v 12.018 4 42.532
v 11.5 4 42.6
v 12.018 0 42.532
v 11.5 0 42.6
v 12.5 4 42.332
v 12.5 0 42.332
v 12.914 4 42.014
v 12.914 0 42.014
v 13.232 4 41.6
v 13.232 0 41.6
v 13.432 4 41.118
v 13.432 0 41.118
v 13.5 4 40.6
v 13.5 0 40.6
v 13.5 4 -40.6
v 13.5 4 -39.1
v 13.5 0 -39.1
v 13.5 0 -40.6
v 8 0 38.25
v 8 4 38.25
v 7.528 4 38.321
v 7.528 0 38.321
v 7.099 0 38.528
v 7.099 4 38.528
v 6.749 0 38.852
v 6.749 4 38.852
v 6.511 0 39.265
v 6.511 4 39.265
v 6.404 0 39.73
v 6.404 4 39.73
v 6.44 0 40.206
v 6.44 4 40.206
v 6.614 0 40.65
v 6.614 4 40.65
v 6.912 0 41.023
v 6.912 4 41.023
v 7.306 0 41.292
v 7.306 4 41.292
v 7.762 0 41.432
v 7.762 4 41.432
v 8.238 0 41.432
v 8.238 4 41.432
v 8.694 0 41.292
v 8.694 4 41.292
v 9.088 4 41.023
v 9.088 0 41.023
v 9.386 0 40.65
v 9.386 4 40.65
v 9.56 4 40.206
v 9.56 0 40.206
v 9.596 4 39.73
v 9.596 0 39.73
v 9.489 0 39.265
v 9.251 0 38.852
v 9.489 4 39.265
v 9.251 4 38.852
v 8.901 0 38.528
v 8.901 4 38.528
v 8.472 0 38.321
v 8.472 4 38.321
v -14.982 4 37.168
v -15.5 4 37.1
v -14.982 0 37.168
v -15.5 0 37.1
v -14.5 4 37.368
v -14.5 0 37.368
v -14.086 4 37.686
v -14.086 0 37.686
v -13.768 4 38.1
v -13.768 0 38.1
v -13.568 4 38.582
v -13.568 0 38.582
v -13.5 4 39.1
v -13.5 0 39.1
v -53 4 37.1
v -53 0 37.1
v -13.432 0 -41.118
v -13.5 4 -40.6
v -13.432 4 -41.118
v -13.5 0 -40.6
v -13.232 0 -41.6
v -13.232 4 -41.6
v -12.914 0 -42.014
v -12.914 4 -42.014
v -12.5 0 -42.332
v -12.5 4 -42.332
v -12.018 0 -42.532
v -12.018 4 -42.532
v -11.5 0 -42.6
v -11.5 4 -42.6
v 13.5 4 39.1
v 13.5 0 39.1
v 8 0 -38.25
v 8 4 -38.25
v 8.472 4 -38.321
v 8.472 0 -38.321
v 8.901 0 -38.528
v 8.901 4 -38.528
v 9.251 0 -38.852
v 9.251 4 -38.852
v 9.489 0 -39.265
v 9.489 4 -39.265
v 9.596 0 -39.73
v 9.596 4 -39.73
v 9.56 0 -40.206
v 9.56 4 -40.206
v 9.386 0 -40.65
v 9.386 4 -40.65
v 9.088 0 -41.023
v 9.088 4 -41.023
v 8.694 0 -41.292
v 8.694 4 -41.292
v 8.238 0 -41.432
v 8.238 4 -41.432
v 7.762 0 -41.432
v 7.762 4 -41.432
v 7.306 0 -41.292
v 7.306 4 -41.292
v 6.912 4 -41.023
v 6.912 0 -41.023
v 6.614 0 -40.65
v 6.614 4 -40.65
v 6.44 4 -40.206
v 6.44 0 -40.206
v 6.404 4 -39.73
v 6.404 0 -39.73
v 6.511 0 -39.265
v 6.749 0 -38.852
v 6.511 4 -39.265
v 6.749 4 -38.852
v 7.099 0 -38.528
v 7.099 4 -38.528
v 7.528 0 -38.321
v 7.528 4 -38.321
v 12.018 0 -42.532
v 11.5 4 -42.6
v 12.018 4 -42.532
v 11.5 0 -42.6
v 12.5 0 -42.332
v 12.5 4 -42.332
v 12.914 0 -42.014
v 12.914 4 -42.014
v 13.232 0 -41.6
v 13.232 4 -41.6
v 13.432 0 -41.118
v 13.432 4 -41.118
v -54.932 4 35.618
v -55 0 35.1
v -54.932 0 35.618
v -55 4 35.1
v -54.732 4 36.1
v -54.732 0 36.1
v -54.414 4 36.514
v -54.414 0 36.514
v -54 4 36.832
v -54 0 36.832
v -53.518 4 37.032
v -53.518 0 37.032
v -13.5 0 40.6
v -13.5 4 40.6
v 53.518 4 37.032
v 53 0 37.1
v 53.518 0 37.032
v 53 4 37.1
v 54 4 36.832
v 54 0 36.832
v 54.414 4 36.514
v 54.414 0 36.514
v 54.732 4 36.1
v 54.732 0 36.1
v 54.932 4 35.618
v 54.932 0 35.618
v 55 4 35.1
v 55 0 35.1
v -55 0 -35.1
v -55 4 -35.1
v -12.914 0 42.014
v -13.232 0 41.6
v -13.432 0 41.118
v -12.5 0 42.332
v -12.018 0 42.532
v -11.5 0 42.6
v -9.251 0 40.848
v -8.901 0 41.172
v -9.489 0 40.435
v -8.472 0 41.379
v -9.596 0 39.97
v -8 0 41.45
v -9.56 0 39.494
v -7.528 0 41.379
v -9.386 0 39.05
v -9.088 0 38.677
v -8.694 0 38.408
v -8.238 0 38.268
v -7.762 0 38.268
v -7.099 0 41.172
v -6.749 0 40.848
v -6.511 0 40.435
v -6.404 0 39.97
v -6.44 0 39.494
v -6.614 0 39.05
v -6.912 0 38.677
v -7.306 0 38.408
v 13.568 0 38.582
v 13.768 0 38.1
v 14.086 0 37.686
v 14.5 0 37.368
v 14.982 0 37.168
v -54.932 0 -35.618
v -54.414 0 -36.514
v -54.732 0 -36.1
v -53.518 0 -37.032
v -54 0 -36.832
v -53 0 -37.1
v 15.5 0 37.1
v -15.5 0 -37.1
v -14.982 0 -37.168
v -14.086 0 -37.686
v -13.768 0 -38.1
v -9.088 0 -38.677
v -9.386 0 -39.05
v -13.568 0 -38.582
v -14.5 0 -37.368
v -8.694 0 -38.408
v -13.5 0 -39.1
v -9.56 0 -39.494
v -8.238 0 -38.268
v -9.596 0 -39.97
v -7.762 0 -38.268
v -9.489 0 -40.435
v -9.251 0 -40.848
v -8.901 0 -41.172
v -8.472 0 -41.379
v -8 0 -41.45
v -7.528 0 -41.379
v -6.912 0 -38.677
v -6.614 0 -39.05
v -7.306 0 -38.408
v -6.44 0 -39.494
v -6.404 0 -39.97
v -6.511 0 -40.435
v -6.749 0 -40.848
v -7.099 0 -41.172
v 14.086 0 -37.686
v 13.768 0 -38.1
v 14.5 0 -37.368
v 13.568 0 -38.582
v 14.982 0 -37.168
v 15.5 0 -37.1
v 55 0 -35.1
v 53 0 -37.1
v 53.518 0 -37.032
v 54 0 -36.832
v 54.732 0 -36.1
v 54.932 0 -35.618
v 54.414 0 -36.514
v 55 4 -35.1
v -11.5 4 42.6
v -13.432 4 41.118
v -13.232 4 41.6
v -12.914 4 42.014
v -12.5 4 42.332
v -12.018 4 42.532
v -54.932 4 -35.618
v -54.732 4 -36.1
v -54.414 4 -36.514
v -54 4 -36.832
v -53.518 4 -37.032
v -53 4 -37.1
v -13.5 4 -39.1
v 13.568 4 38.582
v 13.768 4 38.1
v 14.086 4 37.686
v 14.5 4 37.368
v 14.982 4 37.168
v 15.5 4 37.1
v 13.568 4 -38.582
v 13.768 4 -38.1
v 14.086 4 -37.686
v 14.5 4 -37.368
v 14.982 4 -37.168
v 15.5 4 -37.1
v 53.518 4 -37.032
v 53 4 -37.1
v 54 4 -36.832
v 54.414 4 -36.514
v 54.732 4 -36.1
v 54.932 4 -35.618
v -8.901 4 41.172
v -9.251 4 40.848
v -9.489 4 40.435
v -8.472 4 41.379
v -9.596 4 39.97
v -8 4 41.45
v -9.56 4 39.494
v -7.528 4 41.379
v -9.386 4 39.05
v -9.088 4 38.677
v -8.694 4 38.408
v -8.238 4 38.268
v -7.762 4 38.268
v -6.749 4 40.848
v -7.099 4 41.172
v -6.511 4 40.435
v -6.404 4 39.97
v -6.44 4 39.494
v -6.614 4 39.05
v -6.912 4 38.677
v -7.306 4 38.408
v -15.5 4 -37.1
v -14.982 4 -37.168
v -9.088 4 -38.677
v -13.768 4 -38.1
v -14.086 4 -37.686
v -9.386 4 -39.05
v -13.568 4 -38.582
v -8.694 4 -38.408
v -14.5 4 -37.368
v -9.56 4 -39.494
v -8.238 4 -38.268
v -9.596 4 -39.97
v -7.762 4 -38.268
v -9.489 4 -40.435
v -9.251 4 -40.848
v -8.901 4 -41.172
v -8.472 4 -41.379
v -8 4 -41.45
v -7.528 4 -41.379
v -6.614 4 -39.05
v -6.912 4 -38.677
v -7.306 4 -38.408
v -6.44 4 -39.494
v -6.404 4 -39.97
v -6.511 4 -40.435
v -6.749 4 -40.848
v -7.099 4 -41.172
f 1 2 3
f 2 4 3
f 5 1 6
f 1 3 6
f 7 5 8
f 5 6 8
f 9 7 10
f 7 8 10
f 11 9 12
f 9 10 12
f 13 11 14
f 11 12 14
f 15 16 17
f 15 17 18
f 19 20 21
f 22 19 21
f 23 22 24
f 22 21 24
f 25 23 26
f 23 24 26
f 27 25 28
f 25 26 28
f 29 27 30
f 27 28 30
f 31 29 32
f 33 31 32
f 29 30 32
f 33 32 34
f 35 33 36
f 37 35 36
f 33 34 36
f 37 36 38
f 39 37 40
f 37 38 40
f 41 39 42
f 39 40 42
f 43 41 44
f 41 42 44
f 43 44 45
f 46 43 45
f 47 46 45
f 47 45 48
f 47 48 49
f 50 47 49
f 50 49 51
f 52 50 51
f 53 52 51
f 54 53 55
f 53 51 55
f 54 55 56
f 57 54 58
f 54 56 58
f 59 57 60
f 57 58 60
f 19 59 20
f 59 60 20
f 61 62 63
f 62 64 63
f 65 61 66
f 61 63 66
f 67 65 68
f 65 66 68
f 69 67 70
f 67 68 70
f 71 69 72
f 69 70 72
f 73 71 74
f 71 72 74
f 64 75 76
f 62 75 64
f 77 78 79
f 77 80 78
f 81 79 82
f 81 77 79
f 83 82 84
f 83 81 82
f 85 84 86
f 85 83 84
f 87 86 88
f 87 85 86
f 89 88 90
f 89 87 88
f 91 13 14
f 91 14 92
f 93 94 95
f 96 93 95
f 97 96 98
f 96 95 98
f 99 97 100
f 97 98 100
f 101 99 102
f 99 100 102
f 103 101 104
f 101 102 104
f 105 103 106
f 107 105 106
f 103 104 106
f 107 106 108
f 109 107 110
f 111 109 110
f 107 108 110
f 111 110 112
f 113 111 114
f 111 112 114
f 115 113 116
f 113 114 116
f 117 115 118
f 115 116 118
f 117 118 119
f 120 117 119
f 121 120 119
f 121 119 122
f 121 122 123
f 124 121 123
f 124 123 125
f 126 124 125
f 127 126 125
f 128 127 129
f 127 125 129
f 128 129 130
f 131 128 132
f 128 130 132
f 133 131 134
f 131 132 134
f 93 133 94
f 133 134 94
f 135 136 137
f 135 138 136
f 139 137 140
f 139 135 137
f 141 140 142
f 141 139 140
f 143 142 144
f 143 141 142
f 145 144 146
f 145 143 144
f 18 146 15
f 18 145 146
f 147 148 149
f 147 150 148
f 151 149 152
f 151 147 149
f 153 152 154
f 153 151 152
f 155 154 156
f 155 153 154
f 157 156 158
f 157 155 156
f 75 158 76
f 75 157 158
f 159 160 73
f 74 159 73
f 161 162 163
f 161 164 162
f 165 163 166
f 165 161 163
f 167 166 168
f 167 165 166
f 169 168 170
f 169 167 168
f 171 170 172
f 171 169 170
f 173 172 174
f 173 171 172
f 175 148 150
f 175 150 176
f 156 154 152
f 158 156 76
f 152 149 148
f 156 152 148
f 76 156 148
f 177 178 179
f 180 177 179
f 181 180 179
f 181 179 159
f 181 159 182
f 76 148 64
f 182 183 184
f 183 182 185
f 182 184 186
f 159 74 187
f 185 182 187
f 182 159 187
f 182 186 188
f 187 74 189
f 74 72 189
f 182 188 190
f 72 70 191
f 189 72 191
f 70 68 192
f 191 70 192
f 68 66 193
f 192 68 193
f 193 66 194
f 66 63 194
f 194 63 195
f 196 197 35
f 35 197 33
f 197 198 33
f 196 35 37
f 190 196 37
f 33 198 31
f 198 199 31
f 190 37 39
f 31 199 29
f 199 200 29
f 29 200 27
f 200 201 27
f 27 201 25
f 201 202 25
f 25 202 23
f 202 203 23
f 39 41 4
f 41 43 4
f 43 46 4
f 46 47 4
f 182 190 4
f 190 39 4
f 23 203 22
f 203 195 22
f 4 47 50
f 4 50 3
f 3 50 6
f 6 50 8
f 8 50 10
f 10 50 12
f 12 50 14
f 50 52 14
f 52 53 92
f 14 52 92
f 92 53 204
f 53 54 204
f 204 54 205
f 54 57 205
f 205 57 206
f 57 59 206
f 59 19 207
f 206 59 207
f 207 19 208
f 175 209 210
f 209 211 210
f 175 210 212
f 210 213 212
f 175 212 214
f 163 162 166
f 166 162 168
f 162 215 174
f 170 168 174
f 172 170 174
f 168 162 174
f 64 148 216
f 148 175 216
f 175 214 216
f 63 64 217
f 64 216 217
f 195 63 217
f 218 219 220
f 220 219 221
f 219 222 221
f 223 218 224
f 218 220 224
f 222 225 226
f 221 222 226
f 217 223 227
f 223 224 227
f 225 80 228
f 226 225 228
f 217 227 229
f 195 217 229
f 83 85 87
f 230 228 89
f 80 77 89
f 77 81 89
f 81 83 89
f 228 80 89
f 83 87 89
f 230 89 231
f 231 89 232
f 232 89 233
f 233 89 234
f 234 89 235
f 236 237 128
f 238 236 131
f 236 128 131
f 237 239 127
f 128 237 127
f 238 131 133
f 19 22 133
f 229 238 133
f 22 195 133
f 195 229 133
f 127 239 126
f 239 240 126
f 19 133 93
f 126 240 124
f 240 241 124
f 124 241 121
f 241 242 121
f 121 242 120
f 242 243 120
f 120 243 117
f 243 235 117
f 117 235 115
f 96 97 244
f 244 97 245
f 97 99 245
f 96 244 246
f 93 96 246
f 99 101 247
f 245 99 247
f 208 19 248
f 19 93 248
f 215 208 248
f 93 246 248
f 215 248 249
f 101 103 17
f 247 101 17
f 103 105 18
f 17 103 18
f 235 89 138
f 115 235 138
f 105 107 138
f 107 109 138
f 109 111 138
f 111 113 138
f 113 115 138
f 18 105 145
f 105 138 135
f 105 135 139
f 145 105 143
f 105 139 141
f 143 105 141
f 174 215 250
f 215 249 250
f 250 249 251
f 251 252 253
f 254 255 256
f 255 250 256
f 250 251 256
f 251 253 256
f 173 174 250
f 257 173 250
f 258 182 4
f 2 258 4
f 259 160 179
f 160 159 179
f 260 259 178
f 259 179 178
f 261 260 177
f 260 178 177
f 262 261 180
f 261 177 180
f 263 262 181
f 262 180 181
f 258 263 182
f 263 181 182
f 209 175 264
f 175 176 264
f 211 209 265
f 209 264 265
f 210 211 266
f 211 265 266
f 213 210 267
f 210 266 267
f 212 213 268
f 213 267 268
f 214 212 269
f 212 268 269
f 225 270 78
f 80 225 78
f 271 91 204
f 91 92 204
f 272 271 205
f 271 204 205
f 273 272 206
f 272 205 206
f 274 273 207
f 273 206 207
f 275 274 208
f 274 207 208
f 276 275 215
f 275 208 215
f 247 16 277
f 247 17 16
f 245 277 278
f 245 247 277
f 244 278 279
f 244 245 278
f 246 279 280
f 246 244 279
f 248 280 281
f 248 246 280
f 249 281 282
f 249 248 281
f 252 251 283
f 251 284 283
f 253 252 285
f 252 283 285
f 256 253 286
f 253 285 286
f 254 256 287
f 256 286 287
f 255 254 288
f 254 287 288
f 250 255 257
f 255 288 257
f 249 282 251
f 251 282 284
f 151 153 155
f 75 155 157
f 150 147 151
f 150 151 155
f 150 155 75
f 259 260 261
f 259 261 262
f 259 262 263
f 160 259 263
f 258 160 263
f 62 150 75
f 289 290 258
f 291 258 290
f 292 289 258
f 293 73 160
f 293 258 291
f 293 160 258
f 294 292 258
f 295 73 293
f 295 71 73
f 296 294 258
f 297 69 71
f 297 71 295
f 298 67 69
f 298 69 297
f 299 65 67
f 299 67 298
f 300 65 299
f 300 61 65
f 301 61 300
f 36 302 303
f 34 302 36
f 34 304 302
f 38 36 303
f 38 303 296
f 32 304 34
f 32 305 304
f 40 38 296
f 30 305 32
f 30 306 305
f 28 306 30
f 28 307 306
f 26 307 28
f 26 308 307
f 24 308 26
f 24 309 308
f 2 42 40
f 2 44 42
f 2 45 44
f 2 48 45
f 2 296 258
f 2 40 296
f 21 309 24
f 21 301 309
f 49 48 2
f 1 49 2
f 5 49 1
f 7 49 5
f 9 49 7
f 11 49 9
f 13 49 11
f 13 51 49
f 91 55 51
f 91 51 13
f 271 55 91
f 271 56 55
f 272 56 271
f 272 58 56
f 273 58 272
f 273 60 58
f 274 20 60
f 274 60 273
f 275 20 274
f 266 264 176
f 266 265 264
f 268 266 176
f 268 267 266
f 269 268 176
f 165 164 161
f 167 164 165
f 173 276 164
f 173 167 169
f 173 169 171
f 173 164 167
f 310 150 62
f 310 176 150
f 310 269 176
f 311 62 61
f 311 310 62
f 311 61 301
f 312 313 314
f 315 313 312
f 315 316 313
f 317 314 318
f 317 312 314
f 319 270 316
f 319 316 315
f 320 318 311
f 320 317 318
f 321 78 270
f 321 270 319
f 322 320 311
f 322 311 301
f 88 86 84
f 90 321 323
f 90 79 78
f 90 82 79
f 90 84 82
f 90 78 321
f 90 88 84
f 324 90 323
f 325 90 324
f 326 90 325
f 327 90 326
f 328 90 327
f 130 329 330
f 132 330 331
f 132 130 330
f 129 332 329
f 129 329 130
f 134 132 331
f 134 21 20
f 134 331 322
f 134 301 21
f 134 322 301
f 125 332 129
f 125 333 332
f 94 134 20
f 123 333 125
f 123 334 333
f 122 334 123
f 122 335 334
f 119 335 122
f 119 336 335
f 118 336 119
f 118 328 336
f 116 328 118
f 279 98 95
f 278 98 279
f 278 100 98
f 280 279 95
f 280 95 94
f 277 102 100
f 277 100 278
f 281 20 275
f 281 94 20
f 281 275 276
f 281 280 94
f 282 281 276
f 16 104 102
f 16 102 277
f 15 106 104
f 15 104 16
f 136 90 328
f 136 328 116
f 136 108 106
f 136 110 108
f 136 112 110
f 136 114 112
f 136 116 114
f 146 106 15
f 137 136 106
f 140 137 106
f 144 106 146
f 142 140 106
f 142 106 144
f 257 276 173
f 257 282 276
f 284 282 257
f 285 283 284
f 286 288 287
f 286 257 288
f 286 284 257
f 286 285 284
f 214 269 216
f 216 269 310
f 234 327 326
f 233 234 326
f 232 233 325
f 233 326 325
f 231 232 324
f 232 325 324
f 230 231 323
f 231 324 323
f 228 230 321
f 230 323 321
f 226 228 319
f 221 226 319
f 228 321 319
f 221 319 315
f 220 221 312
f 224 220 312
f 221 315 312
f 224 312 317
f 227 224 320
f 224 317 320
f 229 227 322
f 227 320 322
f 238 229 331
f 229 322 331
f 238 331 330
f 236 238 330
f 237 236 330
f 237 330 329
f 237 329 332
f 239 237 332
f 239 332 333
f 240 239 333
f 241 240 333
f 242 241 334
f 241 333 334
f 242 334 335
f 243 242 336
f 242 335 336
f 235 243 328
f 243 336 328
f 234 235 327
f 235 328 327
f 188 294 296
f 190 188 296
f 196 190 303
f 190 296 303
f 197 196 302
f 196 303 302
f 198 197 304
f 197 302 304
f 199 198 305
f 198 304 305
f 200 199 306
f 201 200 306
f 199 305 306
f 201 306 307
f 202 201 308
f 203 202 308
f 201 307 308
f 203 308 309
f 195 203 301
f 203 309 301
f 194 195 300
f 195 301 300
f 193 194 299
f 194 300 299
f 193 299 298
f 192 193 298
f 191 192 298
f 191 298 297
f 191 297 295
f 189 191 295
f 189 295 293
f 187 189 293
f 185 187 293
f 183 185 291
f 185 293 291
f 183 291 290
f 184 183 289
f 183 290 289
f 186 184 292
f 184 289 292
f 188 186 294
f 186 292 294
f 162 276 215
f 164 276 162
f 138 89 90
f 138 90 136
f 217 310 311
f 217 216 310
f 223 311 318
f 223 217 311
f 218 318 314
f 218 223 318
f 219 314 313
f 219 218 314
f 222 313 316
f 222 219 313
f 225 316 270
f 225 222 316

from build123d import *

# Parameters (mm, degrees)
SKETCH_1_W          = 110
SKETCH_1_H          = 85.2
EXTRUDE_1_DEPTH     = 4
SKETCH_2_W          = 83
SKETCH_2_H          = 11
CUT_EXTRUDE_1_DEPTH = 4
SKETCH_3_R          = 1.6
CUT_EXTRUDE_2_DEPTH = 4
FILLET_1_R          = 2


with BuildPart() as part:
    # 草图1 → 凸台-拉伸1 (new body)
    with BuildSketch(Plane(origin=(0, 0, 0), x_dir=(1, 0, 0), z_dir=(0, 1, 0))):
        Rectangle(SKETCH_1_W, SKETCH_1_H)
    extrude(amount=EXTRUDE_1_DEPTH)

    # 草图2 → 切除-拉伸1 (cut)
    with BuildSketch(Plane(origin=(0, 4, 0), x_dir=(1, 0, 0), z_dir=(0, 1, 0))):
        with Locations((-55, -42.6)):
            Rectangle(SKETCH_2_W, SKETCH_2_H)
        with Locations((55, -42.6)):
            Rectangle(SKETCH_2_W, SKETCH_2_H)
        with Locations((55, 42.6)):
            Rectangle(SKETCH_2_W, SKETCH_2_H)
        with Locations((-55, 42.6)):
            Rectangle(SKETCH_2_W, SKETCH_2_H)
    extrude(amount=-CUT_EXTRUDE_1_DEPTH, mode=Mode.SUBTRACT)

    # 草图3 → 切除-拉伸2 (cut)
    with BuildSketch(Plane(origin=(0, 4, 0), x_dir=(1, 0, 0), z_dir=(0, 1, 0))):
        with Locations(Location((-8, -39.85, 0), (0, 0, 270))):
            Circle(SKETCH_3_R)
        with Locations(Location((8, -39.85, 0), (0, 0, 90))):
            Circle(SKETCH_3_R)
        with Locations(Location((8, 39.85, 0), (0, 0, 270))):
            Circle(SKETCH_3_R)
        with Locations(Location((-8, 39.85, 0), (0, 0, 90))):
            Circle(SKETCH_3_R)
    extrude(amount=-CUT_EXTRUDE_2_DEPTH, mode=Mode.SUBTRACT)

    # 圆角1
    fillet_1_edges = [part.edges().sort_by_distance(p)[0] for p in [
        (-13.5, 2, 42.6),
        (-13.5, 2, 37.1),
        (-55, 2, 37.1),
        (13.5, 2, 42.6),
        (55, 2, 37.1),
        (13.5, 2, 37.1),
        (55, 2, -37.1),
        (13.5, 2, -42.6),
        (13.5, 2, -37.1),
        (-13.5, 2, -42.6),
        (-55, 2, -37.1),
        (-13.5, 2, -37.1),
    ]]
    fillet(fillet_1_edges, radius=FILLET_1_R)


solid = part.part
